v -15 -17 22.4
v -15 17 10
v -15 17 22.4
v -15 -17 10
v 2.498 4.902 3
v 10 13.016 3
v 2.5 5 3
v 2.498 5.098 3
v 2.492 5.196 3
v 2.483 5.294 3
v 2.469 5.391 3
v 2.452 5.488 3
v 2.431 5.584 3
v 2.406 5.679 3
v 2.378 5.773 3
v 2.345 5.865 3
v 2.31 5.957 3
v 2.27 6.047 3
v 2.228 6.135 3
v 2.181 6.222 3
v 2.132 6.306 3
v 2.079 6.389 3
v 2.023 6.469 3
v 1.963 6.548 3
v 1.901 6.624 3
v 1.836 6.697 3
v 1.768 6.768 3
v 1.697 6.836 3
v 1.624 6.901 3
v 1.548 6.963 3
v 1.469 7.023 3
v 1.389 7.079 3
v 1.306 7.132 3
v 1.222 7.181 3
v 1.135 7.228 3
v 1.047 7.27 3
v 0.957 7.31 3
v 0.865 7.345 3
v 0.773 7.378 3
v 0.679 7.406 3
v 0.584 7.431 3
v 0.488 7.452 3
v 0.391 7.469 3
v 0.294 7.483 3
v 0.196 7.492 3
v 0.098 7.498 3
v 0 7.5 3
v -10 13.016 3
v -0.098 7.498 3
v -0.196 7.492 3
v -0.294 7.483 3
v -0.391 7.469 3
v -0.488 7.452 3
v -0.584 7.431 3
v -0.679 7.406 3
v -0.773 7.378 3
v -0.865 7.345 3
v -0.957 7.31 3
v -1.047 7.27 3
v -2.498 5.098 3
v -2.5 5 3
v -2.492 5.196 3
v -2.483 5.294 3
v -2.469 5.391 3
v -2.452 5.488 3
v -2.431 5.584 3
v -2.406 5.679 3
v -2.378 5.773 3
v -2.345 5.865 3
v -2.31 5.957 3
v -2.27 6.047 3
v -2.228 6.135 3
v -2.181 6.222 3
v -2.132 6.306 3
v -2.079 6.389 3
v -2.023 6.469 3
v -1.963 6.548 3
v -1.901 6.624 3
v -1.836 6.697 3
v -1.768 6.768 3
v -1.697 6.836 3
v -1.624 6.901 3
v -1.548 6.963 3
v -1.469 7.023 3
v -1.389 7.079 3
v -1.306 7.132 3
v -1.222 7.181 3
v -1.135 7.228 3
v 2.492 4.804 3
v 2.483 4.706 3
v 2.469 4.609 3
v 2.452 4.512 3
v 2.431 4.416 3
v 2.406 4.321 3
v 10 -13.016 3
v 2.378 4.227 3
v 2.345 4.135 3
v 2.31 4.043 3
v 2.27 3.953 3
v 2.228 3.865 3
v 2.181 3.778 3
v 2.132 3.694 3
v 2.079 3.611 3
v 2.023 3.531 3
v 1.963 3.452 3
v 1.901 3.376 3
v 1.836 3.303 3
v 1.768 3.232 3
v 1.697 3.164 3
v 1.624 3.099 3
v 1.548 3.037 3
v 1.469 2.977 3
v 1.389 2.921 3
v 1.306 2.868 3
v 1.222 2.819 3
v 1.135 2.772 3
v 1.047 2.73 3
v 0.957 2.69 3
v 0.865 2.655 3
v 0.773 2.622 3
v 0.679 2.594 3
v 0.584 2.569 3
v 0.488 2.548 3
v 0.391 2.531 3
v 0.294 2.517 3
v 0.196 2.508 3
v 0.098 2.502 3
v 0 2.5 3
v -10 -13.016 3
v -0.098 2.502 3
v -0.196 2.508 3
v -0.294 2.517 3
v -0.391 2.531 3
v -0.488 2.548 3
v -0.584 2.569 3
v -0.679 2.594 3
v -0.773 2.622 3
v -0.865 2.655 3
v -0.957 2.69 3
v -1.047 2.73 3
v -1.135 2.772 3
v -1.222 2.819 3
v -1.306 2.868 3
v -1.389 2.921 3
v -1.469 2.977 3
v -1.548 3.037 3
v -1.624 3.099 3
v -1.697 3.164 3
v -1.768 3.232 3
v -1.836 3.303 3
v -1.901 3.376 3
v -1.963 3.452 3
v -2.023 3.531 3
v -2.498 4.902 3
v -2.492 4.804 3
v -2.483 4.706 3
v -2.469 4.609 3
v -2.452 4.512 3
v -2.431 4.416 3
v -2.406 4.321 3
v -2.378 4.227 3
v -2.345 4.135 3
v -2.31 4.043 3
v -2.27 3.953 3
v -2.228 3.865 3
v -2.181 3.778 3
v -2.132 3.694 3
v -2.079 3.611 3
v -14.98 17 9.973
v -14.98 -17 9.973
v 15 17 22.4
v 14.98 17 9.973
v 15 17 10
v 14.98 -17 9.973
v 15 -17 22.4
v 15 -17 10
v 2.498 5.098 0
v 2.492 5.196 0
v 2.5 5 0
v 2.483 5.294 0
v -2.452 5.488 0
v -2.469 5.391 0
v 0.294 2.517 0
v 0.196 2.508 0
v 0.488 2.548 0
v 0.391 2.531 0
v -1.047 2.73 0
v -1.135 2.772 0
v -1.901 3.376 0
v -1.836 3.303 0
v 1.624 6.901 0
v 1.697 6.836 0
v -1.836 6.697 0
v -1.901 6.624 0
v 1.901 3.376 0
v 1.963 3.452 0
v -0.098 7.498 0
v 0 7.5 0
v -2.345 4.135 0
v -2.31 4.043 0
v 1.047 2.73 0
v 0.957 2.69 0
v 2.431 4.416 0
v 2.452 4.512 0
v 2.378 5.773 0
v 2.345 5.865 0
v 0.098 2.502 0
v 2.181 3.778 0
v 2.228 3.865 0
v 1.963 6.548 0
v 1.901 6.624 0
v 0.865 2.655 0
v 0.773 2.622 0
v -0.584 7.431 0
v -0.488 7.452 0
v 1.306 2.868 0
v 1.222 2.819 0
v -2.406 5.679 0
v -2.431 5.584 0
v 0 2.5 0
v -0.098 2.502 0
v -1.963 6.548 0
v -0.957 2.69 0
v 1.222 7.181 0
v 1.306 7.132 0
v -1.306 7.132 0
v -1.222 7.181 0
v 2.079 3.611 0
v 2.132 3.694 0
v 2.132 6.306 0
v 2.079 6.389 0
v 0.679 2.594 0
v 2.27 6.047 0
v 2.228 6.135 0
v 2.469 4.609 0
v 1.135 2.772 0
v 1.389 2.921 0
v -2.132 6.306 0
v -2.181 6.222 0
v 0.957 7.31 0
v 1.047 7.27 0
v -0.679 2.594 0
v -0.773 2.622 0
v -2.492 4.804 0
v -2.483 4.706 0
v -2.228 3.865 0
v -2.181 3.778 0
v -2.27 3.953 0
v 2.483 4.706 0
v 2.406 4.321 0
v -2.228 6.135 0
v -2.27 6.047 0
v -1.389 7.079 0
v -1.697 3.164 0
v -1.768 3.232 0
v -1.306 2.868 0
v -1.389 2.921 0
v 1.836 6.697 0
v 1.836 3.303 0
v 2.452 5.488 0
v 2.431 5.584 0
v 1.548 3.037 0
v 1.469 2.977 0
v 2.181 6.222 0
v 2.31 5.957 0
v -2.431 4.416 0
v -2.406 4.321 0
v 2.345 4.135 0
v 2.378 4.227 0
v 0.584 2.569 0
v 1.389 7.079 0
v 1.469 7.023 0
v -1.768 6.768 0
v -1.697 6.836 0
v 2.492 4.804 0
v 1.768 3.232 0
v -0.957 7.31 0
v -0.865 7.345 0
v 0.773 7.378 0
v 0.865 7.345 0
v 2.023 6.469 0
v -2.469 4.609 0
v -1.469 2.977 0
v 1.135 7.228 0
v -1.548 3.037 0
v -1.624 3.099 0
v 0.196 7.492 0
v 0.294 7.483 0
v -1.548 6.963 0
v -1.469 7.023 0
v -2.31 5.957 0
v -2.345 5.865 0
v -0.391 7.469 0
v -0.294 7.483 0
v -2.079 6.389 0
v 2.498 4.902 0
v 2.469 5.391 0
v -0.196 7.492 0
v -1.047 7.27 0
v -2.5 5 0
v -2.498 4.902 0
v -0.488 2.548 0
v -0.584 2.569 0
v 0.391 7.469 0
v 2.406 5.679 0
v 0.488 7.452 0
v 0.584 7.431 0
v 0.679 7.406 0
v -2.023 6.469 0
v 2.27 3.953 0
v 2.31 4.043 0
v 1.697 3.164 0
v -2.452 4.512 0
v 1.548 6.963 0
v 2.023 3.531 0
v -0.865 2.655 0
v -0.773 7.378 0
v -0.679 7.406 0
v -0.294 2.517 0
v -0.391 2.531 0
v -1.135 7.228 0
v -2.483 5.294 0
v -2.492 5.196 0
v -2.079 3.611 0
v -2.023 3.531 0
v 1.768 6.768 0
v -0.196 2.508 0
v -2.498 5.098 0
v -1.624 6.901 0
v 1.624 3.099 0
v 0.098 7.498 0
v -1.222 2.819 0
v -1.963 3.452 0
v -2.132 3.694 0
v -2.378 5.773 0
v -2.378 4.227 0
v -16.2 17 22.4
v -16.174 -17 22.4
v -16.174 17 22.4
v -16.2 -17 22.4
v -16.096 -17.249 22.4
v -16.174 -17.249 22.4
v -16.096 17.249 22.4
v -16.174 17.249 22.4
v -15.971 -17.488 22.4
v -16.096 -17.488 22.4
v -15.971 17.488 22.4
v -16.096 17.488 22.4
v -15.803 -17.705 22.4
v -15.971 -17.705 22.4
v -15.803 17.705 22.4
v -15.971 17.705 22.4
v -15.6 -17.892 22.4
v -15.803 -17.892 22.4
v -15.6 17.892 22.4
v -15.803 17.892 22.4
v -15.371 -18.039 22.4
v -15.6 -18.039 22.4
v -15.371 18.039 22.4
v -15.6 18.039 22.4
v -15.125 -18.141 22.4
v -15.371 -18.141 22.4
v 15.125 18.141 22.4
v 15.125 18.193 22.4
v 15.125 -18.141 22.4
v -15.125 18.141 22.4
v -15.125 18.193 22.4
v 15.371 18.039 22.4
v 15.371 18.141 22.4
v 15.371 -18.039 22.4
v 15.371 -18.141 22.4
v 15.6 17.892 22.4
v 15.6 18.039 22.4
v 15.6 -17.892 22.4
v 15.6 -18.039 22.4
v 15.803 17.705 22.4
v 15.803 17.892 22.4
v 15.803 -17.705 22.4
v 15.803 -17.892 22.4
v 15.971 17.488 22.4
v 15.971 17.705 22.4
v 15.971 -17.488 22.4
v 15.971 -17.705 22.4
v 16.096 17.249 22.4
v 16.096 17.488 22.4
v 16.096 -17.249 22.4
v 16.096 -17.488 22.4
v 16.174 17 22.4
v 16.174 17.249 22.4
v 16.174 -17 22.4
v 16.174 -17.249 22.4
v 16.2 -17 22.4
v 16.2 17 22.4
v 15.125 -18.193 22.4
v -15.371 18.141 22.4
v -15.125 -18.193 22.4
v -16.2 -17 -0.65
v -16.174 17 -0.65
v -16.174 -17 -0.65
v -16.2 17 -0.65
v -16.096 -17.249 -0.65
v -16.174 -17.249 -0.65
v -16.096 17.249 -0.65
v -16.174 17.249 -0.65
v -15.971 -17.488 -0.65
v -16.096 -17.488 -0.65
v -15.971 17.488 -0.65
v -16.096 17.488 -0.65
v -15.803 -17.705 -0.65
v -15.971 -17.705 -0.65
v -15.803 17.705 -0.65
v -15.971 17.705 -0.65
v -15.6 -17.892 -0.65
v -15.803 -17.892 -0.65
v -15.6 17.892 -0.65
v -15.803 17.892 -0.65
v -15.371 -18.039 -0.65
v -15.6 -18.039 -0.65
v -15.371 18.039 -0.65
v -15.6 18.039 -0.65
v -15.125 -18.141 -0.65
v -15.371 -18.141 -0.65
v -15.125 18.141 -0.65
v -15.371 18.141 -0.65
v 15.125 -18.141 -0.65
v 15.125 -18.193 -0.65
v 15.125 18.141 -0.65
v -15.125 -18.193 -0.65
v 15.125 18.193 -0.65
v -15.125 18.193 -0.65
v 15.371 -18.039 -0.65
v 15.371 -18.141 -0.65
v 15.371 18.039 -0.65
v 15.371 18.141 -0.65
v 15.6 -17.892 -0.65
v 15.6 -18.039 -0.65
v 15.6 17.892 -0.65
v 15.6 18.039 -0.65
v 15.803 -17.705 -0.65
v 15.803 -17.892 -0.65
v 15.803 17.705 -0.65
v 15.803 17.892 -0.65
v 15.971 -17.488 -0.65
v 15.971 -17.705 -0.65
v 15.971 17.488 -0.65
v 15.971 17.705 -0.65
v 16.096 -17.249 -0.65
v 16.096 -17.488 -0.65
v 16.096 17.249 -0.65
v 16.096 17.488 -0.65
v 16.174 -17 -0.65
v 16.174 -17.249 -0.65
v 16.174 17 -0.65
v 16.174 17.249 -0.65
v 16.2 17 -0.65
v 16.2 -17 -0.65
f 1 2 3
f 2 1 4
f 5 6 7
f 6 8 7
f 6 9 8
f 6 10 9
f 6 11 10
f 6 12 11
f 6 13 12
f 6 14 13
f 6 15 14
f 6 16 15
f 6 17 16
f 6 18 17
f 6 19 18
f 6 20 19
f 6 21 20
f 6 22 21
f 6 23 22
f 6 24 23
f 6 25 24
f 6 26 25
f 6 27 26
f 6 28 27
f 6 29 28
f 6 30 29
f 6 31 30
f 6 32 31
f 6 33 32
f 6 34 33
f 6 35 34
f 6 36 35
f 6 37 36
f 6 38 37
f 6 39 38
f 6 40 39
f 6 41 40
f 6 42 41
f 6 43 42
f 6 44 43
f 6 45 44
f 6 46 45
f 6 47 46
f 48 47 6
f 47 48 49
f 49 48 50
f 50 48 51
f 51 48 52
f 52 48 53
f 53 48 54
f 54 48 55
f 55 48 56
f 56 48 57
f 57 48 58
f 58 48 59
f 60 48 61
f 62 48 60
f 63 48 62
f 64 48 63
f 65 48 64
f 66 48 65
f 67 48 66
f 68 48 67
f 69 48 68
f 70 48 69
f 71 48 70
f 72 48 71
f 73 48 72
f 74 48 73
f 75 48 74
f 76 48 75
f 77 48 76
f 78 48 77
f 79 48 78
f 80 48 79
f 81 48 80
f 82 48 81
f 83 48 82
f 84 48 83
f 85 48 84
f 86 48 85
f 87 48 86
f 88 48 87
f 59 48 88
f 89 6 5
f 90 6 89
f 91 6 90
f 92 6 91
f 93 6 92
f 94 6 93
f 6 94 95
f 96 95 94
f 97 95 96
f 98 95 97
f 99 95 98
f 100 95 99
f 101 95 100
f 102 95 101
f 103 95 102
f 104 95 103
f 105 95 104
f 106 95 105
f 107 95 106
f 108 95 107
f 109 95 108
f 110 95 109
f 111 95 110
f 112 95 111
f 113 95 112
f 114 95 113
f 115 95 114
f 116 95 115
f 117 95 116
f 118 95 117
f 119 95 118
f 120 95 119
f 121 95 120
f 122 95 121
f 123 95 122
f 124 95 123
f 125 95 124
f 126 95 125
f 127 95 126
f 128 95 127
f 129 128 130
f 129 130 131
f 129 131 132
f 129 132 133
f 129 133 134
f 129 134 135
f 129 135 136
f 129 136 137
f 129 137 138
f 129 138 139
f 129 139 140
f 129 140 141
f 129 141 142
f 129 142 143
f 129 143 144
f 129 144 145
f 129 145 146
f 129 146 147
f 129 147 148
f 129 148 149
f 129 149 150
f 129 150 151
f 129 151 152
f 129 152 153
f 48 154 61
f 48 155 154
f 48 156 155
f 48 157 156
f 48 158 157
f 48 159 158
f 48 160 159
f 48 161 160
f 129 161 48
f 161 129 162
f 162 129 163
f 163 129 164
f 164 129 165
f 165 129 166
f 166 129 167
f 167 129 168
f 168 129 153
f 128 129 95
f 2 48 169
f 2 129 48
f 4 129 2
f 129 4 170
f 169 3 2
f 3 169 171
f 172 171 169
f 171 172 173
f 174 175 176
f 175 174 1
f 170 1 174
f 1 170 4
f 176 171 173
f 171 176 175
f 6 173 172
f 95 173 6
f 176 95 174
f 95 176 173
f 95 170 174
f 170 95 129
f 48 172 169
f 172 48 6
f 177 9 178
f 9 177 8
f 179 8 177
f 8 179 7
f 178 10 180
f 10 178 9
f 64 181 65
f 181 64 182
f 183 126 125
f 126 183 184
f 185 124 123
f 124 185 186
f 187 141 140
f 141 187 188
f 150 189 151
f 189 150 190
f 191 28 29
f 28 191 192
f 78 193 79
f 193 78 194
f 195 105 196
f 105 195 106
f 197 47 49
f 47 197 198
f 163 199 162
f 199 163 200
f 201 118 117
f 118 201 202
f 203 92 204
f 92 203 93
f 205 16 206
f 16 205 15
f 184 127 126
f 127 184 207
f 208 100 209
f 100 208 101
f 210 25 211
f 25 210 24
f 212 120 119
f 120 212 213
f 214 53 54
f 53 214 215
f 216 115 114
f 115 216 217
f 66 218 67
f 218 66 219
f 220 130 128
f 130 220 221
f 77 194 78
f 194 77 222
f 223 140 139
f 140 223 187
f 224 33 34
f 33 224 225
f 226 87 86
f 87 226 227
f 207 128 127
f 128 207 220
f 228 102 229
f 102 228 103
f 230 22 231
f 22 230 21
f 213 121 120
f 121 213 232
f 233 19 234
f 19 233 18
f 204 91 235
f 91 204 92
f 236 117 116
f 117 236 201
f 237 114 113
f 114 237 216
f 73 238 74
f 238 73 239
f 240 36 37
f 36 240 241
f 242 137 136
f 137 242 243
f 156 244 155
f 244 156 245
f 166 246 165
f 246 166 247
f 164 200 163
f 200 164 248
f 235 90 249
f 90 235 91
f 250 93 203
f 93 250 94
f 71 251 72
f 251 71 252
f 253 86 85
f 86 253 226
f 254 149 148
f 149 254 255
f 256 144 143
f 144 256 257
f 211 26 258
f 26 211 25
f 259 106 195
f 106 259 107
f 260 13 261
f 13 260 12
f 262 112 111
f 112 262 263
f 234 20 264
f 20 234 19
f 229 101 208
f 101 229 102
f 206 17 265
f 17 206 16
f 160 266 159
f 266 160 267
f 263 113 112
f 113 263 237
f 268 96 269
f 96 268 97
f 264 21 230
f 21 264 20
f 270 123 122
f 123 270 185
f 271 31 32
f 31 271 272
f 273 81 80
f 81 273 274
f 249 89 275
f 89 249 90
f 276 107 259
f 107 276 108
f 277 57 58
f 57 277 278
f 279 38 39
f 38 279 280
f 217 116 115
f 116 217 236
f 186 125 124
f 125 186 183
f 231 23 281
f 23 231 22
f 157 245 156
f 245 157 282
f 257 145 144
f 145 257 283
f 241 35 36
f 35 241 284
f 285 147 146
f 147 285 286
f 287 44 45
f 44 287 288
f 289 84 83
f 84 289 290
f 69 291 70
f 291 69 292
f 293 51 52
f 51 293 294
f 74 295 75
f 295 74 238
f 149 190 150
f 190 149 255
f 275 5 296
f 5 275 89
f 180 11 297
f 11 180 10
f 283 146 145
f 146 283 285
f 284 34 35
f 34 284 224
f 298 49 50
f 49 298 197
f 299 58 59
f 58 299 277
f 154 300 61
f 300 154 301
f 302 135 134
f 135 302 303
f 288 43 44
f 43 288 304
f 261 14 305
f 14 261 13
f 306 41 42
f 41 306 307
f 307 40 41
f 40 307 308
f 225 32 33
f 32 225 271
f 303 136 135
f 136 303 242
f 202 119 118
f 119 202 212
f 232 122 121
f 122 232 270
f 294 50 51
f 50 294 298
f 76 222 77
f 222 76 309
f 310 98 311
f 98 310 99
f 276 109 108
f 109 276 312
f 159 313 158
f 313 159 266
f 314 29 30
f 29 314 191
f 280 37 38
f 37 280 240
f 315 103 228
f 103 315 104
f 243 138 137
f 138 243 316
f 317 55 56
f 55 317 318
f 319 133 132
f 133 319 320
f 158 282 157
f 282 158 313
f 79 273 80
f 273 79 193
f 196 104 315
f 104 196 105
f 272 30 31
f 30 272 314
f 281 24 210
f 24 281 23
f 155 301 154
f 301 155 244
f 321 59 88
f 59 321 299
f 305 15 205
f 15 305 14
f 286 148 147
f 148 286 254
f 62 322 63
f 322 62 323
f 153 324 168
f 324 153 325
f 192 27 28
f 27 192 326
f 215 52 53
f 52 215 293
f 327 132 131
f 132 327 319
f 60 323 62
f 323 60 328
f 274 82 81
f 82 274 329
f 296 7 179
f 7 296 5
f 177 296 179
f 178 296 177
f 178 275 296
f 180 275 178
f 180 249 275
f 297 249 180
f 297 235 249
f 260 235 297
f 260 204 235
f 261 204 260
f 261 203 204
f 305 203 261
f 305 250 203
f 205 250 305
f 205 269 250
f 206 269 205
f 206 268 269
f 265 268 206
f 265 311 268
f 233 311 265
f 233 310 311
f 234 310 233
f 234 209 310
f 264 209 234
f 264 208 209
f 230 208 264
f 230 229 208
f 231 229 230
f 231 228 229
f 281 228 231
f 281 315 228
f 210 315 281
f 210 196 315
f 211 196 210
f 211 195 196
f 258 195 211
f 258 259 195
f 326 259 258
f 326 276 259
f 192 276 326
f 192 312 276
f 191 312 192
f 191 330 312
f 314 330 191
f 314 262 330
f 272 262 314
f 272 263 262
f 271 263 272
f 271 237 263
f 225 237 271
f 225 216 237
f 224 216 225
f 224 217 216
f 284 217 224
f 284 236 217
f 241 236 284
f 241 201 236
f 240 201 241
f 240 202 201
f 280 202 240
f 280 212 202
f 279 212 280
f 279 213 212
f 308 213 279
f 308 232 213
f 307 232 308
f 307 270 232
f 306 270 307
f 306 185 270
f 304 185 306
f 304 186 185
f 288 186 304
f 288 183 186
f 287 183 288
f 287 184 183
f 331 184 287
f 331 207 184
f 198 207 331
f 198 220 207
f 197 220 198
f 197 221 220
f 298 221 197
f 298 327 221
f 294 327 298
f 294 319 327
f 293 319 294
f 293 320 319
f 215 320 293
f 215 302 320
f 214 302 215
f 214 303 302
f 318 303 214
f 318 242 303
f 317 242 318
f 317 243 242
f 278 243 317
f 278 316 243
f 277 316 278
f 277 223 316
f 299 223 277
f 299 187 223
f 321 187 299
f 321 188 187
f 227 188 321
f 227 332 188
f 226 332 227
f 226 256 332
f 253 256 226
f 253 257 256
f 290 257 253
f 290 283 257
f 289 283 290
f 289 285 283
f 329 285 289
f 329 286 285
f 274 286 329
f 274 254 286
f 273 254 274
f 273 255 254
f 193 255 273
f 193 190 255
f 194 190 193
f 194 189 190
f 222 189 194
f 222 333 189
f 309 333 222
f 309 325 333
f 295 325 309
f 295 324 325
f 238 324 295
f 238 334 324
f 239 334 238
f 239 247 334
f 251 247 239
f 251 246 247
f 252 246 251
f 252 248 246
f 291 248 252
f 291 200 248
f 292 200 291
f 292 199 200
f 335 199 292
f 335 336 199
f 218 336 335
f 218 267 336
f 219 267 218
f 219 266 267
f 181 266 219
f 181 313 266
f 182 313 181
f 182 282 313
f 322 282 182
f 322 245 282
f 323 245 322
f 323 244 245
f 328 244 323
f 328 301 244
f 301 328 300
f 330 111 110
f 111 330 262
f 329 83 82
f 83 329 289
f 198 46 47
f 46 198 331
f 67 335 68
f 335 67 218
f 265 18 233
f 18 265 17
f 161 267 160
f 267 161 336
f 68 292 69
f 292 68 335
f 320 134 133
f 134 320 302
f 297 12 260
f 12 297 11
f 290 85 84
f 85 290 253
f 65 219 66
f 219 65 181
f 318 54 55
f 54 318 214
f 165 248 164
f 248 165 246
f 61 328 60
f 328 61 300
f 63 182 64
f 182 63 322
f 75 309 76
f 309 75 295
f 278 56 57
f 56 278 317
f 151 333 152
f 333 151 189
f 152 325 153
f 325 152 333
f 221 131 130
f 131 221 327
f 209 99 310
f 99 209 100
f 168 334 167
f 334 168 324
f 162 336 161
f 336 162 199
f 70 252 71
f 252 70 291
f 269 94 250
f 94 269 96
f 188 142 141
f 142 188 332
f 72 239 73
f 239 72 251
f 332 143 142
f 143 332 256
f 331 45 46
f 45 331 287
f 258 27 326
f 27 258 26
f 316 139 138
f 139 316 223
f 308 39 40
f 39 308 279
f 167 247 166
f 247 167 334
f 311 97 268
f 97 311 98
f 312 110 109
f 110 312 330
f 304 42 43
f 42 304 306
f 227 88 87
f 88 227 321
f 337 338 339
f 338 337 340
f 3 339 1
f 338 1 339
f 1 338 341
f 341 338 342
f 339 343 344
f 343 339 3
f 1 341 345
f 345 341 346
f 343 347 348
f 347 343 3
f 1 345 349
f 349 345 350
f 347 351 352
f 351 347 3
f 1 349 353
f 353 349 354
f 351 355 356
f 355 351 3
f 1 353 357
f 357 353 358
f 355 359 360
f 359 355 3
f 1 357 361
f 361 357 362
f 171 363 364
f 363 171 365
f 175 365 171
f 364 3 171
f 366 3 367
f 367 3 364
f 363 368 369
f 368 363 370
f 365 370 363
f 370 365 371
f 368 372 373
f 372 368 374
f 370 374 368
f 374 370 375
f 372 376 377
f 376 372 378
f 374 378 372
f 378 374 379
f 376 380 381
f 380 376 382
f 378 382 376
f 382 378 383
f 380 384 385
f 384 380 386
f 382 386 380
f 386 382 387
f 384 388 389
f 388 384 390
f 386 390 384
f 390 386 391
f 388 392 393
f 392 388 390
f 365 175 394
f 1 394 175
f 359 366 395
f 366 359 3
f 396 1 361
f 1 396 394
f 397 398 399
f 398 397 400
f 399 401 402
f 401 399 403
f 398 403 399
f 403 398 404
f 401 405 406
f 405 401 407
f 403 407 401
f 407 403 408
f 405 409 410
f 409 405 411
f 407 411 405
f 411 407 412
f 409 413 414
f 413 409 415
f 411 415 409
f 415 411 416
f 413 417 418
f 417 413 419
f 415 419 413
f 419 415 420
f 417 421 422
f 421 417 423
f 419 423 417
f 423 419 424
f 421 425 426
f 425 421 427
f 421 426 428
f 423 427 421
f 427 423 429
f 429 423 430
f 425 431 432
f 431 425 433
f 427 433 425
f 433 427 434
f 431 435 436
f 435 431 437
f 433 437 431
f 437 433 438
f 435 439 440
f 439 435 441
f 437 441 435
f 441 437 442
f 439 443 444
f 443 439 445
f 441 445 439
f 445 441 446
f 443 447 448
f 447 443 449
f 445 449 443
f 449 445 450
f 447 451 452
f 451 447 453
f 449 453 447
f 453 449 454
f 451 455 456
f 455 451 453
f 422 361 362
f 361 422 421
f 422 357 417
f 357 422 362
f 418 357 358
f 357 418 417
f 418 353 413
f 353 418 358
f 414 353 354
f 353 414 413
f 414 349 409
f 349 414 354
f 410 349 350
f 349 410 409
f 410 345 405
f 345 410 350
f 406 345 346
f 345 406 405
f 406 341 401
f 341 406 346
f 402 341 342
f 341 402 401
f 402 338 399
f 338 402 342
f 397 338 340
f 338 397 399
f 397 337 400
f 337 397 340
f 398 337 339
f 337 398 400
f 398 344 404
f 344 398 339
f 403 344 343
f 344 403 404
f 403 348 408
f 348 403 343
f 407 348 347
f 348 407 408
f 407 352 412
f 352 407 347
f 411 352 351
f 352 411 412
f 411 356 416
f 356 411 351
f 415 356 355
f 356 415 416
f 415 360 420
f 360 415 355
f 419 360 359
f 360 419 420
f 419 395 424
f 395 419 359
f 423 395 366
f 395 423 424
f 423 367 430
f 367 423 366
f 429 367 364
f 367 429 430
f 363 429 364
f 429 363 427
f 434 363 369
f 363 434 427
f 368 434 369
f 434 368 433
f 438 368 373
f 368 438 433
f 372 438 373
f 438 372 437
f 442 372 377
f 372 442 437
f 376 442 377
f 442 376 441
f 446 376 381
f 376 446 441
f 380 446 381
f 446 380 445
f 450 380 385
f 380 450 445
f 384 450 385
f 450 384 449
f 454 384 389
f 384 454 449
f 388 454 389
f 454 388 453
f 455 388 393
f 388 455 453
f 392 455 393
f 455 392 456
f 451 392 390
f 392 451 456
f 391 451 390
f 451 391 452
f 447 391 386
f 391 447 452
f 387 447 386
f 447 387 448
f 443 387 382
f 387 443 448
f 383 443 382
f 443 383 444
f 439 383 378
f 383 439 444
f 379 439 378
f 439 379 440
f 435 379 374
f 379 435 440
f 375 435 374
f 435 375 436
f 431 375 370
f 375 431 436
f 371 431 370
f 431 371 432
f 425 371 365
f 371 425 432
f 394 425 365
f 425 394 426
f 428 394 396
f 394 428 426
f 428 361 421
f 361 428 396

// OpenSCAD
/* tie-advanced-bin.scad
 *
 * Copyright (C) Robert B. Ross, 2016
 *
 * This software is released under the Creative Commons
 * Attribution-ShareAlike 4.0 International Public License.
 */


include <./bintools.scad>

$fn=160;

/* locations is a pair of triples, translate : rotate pairs
 */
locations = [[[0,-17.75,0], [0,0,0]],
              [[0,17.75,0],[0,0,0]]];
binHeight   = 46.5/2;

// harborFreightMediumHalfHt(locations,inset=0.0) advancedBlank();

// advancedBlank();
advancedOutline();

/* advancedOutline() -- test piece for outline
 */
module advancedOutline() {
   translate([0,0,22.5]) rotate([180,0,0]) {
      blankCutout(height=binHeight - 0.1, outlineScale=1.2) advancedBlank();
   }
}

module advancedBlank() {
   advancedHeight = 22.5; // total height of the advanced

   rotate([180,0,0]) translate([0,0,-1*advancedHeight]) union() {
      difference() { 
         translate([0,34/2,0]) rotate([90,0,0]) linear_extrude(height=34)
            for(i=[0:1]) mirror([i,0,0]) polygon(points=[[0,0],[0,0],[0,3],
                                                 [10,3],[15,10],
                                                 [15,advancedHeight],
                                                 [0,advancedHeight]]);

         translate([-15.0,-0.01,-0.01]) rotate([-90,0,-90]) linear_extrude(height=30)
            polygon(points=[[17,-10],[17,-3],[13,-3]]);
         translate([15.0,0.01,-0.01]) rotate([-90,0,90]) linear_extrude(height=30)
            polygon(points=[[17,-10],[17,-3],[13,-3]]);
      }
      translate([0,22-17,0]) cylinder(r=5/2,h=3.1);
   } /* rotate and translate */
}

/*
 * Local variables:
 *  mode: C
 *  c-indent-level: 3
 *  c-basic-offset: 3
 * End:
 *
 * vim: ts=8 sts=3 sw=3 expandtab
 */
